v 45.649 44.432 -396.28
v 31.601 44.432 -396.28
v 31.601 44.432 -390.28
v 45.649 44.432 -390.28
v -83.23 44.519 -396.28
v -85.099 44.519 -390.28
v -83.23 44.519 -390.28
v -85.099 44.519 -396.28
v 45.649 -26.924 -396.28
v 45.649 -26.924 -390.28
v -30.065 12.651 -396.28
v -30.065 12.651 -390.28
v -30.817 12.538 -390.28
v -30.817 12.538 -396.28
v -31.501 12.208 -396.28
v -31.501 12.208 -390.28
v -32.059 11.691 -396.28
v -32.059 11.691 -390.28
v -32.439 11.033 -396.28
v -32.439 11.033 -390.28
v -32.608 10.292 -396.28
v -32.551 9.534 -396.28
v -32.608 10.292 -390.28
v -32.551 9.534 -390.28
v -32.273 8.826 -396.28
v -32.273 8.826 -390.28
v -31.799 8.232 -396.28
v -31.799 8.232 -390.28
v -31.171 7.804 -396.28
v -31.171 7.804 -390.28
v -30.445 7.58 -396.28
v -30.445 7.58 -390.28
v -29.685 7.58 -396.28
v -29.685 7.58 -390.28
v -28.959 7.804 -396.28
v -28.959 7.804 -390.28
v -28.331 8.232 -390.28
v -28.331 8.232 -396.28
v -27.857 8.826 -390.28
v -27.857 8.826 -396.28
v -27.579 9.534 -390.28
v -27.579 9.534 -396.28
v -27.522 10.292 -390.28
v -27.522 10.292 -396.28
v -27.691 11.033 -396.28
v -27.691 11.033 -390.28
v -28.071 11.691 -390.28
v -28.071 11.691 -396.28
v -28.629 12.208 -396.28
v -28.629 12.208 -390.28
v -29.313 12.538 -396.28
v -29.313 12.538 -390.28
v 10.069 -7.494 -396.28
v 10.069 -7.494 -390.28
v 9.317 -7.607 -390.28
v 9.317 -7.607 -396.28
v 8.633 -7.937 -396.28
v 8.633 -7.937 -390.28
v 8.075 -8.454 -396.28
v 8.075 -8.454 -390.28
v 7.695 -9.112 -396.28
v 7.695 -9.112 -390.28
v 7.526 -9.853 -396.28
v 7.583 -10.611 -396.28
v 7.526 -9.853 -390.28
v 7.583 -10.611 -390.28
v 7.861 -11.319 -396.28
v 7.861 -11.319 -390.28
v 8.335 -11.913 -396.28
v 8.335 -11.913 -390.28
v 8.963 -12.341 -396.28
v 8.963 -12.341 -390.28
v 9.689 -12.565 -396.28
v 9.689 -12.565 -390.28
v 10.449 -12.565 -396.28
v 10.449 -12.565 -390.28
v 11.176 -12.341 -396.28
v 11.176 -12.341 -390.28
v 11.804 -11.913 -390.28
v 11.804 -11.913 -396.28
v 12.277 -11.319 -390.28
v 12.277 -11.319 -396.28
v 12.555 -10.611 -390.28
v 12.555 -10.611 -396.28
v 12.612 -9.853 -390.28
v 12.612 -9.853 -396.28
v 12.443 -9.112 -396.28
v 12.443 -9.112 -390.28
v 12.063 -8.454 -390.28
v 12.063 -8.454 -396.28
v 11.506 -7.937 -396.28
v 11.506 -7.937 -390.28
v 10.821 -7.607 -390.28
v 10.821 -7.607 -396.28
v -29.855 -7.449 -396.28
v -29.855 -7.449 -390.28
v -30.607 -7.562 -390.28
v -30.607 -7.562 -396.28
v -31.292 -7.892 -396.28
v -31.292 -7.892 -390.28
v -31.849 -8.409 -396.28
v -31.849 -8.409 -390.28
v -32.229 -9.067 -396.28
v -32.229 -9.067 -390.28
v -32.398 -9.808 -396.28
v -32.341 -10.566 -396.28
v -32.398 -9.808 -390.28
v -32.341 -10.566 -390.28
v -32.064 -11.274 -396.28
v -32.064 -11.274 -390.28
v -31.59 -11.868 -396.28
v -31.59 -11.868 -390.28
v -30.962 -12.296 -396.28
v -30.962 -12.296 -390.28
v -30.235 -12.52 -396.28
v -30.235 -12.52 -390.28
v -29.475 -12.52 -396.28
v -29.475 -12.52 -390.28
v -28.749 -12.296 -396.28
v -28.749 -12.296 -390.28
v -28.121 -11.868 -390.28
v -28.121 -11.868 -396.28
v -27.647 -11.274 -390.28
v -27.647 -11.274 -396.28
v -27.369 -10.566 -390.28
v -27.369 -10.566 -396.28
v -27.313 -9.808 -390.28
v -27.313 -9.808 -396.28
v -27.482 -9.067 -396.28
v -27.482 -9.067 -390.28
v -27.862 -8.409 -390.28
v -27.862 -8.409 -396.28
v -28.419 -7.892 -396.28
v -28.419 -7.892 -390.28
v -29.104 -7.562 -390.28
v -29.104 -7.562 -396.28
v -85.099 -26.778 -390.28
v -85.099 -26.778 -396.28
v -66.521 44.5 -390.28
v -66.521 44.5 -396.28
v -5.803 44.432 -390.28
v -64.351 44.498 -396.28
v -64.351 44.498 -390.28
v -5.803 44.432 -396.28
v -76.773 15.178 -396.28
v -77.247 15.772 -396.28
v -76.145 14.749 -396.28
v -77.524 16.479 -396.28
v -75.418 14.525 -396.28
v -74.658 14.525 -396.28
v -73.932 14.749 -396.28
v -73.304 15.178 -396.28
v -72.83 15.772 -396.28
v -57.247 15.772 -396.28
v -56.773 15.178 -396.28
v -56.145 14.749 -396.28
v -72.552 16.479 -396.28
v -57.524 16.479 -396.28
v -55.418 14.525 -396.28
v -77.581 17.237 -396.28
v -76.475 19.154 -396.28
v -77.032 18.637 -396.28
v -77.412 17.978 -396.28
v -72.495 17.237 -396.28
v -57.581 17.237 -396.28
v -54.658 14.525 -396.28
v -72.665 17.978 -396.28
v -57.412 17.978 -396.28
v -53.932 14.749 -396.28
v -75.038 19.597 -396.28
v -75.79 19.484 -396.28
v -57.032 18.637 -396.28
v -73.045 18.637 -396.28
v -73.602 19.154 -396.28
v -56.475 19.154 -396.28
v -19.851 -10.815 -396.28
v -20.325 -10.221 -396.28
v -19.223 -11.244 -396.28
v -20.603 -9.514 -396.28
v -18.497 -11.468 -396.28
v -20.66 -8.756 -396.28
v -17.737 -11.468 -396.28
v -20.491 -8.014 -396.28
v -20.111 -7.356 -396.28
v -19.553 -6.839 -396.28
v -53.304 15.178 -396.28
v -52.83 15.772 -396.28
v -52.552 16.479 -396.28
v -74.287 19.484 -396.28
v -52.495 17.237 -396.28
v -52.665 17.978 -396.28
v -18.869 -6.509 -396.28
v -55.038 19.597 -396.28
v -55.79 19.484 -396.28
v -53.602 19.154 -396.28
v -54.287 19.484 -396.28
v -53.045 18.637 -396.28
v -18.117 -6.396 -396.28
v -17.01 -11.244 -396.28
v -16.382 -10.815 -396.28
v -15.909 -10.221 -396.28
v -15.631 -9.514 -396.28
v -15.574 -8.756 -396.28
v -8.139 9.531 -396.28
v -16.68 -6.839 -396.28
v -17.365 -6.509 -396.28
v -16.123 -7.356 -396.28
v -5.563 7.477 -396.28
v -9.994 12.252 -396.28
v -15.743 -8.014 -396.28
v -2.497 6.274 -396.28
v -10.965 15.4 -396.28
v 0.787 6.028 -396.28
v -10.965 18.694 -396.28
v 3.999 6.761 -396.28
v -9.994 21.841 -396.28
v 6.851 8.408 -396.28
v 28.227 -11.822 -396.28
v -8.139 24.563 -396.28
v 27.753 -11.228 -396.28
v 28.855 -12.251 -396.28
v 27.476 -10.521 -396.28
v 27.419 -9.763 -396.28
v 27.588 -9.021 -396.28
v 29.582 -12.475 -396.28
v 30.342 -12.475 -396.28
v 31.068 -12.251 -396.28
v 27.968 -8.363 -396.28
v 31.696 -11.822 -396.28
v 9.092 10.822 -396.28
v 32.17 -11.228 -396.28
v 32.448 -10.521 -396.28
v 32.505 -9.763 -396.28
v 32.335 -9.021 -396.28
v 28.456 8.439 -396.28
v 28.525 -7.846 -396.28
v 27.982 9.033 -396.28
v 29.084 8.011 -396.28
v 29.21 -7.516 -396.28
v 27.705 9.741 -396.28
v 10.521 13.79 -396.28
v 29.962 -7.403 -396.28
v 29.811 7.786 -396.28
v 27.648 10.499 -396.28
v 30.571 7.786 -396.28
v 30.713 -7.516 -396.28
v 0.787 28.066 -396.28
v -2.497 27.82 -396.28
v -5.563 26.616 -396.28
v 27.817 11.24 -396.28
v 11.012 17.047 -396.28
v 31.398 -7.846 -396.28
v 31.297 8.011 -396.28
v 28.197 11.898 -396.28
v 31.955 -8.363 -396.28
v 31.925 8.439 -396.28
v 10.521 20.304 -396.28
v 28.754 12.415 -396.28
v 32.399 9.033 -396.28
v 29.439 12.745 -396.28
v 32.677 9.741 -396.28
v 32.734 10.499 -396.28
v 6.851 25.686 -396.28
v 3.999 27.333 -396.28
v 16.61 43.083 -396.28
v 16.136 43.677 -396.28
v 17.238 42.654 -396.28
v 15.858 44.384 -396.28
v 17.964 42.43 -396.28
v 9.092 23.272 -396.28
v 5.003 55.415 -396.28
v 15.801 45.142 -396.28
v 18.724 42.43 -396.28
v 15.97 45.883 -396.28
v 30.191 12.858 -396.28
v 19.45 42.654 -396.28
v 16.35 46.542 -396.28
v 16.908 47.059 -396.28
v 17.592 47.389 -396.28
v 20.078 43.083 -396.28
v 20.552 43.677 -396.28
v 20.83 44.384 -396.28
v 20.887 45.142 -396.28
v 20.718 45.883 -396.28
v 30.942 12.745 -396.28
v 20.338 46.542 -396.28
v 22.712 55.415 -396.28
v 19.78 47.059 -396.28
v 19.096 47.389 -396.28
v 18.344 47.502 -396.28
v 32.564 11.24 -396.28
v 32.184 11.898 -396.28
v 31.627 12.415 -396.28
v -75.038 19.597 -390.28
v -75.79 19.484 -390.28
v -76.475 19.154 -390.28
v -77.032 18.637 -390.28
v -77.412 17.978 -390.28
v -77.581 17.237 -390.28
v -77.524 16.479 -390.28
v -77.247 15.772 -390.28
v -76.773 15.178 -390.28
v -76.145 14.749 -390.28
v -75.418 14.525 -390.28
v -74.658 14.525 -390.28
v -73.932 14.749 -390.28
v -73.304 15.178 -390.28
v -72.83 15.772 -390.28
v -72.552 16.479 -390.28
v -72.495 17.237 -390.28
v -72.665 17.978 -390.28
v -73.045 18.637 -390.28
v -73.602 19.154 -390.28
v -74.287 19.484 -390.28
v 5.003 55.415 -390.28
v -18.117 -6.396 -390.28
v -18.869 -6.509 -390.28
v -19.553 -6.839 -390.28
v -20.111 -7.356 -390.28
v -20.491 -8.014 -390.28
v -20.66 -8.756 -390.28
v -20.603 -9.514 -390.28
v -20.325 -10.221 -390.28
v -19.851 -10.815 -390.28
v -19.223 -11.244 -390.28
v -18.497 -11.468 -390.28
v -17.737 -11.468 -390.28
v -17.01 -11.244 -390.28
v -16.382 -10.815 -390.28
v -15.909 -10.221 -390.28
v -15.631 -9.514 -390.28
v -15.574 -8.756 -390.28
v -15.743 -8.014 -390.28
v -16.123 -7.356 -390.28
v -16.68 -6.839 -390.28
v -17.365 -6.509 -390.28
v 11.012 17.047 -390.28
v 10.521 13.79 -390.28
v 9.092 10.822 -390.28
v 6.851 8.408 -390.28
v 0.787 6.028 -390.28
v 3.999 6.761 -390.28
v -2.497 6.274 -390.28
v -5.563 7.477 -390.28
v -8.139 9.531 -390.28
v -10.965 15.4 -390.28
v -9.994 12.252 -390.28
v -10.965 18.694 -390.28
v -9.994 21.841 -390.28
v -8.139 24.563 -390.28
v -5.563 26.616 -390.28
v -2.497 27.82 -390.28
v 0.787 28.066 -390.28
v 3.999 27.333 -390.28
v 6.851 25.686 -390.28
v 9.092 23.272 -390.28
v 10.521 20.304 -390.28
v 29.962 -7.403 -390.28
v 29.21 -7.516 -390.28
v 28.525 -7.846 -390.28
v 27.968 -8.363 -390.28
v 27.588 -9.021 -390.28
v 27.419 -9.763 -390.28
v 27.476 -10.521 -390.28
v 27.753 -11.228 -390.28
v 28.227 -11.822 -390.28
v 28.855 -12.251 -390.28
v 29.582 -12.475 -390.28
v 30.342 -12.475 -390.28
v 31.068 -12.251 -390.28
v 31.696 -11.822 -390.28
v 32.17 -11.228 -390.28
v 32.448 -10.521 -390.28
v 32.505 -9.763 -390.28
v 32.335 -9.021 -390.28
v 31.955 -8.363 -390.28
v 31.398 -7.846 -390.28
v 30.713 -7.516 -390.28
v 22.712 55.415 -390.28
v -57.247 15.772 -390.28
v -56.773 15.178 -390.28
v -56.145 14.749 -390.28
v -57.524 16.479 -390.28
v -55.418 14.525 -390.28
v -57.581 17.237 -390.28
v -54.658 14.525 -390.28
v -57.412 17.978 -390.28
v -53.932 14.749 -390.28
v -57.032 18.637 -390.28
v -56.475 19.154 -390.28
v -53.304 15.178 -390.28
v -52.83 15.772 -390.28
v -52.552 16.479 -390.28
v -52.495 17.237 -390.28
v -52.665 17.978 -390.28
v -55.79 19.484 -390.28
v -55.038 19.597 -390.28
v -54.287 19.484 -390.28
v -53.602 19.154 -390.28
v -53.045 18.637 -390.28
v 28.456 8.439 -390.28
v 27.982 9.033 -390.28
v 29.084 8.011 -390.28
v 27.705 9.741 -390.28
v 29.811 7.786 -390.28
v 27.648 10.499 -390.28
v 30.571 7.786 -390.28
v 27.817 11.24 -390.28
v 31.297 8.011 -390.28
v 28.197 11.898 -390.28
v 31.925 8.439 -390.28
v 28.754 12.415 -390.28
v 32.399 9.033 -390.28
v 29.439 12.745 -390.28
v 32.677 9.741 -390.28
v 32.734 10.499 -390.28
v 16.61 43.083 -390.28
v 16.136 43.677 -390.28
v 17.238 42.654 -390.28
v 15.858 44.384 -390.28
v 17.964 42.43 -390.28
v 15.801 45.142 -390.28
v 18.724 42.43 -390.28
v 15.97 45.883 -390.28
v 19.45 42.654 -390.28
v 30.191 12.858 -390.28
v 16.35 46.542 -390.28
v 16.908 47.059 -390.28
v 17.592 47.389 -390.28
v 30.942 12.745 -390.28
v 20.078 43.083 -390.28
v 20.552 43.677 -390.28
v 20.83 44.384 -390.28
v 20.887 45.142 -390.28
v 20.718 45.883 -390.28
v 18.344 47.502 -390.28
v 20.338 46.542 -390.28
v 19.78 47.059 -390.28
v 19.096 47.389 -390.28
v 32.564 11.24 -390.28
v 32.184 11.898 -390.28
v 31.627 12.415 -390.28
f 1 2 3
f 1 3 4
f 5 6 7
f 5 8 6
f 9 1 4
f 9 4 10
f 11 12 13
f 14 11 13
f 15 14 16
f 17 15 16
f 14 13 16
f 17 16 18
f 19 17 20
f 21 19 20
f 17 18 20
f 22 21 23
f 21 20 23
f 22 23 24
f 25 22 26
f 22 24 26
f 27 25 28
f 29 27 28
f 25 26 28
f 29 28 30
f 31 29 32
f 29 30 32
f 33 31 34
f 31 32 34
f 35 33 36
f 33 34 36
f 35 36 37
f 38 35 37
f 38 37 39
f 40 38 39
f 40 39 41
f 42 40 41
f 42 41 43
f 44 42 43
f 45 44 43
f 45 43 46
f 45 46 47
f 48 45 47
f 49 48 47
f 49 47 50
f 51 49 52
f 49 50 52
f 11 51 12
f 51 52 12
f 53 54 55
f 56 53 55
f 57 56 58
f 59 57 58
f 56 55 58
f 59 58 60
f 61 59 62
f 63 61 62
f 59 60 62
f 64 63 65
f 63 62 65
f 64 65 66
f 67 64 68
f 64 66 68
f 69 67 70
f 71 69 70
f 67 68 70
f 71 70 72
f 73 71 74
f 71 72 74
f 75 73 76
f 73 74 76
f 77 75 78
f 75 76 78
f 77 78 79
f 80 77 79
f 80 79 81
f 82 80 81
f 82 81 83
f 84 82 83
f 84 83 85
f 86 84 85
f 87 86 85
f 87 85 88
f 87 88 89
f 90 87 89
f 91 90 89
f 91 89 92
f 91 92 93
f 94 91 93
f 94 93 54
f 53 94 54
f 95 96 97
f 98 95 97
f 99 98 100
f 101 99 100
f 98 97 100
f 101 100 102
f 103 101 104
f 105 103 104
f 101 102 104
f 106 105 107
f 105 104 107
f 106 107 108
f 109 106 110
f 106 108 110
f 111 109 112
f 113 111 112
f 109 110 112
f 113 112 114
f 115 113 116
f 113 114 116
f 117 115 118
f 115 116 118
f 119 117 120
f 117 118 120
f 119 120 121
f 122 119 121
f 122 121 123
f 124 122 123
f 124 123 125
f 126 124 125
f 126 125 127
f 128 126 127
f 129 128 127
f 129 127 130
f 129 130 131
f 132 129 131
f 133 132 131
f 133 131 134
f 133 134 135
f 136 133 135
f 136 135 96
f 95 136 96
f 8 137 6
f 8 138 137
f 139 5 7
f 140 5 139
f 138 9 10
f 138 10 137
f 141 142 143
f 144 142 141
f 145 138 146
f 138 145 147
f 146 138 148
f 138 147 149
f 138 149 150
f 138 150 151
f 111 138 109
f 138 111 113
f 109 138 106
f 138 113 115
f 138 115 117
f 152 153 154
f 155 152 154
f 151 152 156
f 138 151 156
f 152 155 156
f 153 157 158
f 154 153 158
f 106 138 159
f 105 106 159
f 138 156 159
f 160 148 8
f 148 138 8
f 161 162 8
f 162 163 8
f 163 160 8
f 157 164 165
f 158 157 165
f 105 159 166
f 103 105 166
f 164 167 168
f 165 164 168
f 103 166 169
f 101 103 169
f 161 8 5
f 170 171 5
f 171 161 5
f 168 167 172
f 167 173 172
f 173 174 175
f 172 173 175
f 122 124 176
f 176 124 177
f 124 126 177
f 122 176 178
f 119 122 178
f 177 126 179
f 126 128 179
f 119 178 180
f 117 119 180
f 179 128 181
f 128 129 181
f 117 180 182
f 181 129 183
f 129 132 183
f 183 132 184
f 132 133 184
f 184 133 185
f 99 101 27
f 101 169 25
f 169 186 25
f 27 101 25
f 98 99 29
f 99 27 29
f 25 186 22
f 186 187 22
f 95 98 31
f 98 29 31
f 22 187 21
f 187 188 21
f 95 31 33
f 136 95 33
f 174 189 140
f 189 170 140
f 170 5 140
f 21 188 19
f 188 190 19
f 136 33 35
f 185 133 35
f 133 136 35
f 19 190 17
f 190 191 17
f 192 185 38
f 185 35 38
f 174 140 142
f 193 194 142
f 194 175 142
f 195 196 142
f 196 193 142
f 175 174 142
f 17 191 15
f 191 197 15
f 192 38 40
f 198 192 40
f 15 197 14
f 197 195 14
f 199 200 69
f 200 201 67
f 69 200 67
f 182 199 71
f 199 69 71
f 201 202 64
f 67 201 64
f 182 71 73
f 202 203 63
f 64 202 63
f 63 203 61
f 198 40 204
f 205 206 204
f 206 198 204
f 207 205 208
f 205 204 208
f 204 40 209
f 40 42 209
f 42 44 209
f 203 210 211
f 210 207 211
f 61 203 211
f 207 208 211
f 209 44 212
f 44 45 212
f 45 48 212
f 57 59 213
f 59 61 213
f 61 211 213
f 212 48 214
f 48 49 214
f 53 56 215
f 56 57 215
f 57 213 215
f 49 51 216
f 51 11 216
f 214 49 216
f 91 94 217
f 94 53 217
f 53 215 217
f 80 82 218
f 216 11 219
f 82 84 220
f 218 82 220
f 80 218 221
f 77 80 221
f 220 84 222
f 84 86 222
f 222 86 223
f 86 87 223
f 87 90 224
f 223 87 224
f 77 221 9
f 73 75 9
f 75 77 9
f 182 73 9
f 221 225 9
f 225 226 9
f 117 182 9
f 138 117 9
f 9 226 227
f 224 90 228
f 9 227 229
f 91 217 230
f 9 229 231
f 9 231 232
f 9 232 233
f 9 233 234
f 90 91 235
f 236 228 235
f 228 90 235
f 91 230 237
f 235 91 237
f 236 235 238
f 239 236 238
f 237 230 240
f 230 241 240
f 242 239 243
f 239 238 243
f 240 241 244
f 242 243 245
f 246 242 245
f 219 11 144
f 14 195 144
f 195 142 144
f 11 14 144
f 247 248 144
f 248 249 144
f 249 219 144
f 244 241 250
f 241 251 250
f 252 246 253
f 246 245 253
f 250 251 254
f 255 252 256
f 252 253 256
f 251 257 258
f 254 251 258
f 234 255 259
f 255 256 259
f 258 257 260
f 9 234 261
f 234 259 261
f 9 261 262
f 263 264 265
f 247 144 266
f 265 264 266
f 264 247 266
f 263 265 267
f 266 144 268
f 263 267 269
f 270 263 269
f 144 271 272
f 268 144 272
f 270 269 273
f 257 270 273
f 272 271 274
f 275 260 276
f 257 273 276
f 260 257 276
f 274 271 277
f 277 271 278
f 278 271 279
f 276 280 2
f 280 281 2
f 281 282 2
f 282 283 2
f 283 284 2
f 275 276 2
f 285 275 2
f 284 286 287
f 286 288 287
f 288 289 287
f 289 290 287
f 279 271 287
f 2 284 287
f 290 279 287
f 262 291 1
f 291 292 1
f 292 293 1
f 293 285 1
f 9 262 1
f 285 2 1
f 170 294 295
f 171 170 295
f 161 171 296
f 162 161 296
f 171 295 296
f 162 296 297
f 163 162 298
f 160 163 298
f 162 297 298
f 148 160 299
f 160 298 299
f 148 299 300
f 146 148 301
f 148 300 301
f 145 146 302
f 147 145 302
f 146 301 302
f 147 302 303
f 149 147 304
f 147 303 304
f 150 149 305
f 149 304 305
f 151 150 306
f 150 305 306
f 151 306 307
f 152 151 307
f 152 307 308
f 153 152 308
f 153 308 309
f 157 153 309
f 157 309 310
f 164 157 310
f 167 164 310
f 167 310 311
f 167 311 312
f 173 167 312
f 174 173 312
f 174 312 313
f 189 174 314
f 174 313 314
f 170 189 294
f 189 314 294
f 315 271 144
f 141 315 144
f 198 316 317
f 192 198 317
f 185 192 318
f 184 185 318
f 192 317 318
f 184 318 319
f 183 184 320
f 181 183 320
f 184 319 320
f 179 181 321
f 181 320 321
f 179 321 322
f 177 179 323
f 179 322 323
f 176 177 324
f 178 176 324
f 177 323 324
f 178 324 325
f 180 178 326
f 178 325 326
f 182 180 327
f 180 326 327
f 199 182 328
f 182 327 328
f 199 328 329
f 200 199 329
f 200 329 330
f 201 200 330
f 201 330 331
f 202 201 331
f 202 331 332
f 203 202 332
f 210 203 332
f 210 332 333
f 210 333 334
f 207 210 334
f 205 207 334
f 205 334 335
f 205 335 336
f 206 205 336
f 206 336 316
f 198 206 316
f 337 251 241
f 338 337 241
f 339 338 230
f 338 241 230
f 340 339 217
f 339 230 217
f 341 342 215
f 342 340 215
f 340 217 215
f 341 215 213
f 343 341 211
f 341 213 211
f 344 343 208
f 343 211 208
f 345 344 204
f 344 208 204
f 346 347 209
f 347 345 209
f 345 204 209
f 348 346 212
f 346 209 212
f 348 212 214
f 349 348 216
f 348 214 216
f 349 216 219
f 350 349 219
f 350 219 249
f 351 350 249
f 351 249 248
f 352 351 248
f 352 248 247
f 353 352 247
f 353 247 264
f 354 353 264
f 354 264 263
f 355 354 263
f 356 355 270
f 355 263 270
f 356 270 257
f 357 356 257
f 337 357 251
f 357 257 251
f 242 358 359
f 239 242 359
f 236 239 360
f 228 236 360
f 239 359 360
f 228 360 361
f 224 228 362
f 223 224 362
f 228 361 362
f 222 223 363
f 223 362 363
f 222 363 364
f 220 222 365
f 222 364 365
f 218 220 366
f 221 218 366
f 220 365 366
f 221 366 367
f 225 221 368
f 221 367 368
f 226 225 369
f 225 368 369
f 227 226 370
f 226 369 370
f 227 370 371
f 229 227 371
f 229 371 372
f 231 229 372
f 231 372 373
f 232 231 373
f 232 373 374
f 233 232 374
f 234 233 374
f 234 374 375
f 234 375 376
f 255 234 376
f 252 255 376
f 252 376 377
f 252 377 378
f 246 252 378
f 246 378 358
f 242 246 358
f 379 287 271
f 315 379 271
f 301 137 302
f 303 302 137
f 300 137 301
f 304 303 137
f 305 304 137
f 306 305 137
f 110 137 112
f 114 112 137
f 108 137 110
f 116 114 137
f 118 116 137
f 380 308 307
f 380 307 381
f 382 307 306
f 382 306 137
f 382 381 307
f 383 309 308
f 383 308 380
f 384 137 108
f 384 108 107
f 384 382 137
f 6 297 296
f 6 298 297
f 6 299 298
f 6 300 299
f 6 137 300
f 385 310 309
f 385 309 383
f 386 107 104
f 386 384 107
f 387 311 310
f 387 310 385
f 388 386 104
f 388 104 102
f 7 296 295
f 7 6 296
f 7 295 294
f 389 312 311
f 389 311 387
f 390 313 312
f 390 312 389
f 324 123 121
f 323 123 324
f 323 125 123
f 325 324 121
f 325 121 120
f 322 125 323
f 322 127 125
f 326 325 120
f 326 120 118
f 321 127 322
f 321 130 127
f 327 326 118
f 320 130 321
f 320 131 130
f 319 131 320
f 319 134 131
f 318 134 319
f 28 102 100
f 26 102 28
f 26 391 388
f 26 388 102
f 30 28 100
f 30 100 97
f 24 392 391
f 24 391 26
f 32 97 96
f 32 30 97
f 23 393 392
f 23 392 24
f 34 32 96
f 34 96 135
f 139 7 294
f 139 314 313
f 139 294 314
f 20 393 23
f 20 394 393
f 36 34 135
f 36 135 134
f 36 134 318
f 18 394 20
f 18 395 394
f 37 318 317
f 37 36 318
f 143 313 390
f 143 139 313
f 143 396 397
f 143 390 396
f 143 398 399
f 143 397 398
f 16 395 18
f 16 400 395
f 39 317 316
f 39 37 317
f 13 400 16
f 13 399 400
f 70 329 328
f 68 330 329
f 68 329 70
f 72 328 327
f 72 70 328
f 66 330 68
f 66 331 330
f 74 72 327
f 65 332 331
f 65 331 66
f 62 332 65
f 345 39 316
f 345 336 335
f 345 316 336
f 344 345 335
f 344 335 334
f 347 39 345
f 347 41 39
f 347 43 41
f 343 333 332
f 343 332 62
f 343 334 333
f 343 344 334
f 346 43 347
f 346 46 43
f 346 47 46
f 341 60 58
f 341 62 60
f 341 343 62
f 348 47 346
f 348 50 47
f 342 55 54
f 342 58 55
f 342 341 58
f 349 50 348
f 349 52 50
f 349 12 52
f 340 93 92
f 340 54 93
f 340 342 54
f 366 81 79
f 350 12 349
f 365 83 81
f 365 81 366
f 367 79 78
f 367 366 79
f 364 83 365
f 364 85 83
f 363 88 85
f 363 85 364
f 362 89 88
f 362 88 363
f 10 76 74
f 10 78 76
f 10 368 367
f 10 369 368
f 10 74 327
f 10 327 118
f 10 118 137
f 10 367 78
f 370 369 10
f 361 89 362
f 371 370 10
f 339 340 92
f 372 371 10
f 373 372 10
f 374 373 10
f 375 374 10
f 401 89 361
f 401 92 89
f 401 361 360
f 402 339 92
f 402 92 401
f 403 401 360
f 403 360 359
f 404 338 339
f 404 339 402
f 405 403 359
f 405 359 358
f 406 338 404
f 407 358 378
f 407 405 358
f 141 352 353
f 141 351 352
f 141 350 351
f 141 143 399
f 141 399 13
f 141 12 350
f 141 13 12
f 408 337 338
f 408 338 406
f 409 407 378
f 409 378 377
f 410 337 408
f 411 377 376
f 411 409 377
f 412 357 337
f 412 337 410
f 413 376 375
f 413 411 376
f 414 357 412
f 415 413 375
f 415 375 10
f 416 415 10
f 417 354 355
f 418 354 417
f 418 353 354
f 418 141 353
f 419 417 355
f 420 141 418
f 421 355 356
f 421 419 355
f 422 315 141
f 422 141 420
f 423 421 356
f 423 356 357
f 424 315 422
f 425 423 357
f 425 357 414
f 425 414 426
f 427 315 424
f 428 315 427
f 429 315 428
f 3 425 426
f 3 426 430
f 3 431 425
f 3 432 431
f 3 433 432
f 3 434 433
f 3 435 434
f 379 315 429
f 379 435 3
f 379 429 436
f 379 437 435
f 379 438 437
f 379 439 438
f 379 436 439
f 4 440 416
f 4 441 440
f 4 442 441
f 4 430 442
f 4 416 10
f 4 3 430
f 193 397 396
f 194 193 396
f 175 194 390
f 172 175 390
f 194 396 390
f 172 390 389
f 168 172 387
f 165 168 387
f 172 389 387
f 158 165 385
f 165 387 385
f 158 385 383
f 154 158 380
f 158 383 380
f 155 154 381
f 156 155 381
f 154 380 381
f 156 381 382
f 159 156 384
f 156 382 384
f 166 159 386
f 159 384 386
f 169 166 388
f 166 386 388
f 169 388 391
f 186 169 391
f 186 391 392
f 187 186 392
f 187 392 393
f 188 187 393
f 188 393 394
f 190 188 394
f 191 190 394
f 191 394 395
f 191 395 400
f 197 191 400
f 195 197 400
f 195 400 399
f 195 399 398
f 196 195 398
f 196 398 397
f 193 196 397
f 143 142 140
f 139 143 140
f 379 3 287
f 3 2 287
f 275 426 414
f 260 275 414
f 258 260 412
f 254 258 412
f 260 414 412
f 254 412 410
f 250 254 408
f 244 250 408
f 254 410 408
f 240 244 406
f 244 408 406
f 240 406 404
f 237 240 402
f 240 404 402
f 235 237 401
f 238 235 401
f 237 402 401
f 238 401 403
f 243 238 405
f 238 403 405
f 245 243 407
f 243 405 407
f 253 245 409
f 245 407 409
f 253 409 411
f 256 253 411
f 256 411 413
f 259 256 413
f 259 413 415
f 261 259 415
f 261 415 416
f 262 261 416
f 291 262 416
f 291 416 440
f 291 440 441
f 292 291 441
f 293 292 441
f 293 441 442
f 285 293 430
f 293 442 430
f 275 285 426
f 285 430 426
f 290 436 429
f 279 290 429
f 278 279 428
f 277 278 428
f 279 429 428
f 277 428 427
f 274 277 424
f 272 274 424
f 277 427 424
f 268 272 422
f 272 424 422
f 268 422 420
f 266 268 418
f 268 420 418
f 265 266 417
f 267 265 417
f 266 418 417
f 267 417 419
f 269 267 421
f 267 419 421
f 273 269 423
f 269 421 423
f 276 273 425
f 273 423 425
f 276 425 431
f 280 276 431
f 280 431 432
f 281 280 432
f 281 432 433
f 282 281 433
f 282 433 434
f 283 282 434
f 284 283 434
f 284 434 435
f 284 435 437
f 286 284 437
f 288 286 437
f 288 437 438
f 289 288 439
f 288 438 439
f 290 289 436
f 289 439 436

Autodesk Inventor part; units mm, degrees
ref_plane "YZ Plane" through (0, 0, 0) normal (1, 0, 0) x (0, 1, 0)
ref_plane "XZ Plane" through (0, 0, 0) normal (0, 1, 0) x (-1, 0, 0)
ref_plane "XY Plane" through (0, 0, 0) normal (0, 0, 1) x (1, 0, 0)
ref_plane "Work Plane1" through (-0.0001, 0, -396.2798) normal (0, 0, 1) x (1, 0, 0)
sketch "Sketch1" plane through (-0.0001, 0, -396.2798) normal (0, 0, 1) x (1, 0, 0)
  circle A0 centre (29.9617, 10.0469) radius 2.1 projected
  circle A1 centre (29.9617, -9.9531) radius 2.1 projected
  circle A2 centre (-30.0383, -9.9531) radius 2.1 projected
  circle A3 centre (-30.0383, 10.0469) radius 2.1 projected
  circle A4 centre (-10.0383, -9.9531) radius 2.1 projected
  circle A5 centre (9.9617, -9.9531) radius 2.1 projected
  line L0 (39.9617, 19.5469) -> (39.9617, 14.8783) projected
  line L1 (39.9617, -14.7846) -> (39.9617, -19.4531) projected
  line L2 (39.4617, -19.9531) -> (34.7932, -19.9531) projected
  line L3 (20.4617, 20.0469) -> (25.0617, 20.0469) projected
  line L4 (-34.8697, -19.9531) -> (-39.5383, -19.9531) projected
  line L5 (-40.0383, 14.8783) -> (-40.0383, 19.5469) projected
  line L6 (-39.5383, 20.0469) -> (-34.9383, 20.0469) projected
  line L7 (-40.0383, -19.4531) -> (-40.0383, -14.7846) projected
  line L8 (39.9617, 20.0469) -> (39.9617, -19.9532) construction
  line L9 (39.9617, -19.9532) -> (-40.0383, -19.9531) construction
  line L10 (-40.0383, -19.9531) -> (-40.0383, 20.0469) construction
  line L11 (-20.0383, 19.5469) -> (-20.0383, 14.8783) projected
  line L12 (19.9617, 0.0469) -> (19.9617, 5.2154) projected
  line L13 (-20.0383, 0.0469) -> (-14.9383, 0.0469) projected
  line L14 (39.9617, 20.0469) -> (19.9617, 20.0469) construction
  line L15 (19.9617, 20.0469) -> (19.9617, 0.0469) construction
  line L16 (-20.0383, 0.0469) -> (19.9617, 0.0469) construction
  line L17 (-40.0383, 20.0469) -> (-20.0383, 20.0469) construction
  line L18 (-20.0383, 20.0469) -> (-20.0383, 0.0469) construction
  line L19 (45.6493, 27.0762) -> (45.6493, -26.9238)
  line L20 (-64.252, 0) -> (79.446, 0) construction
  line L21 (18.0586, 45.1257) -> (28.1307, -1.0304) construction
  line L22 (28.1307, -1.0304) -> (-18.0254, -11.1025) construction
  circle A6 centre (28.1307, -1.0304) radius 2.55
  circle A7 centre (-18.0452, -9.0596) radius 2.55
  circle A8 centre (18.0586, 45.1257) radius 2.55
  circle A9 centre (-18.0452, -9.0596) radius 3.5 construction
  circle A10 centre (18.0586, 45.1257) radius 3.5 construction
  circle A11 centre (28.1307, -1.0304) radius 3.5 construction
  line L23 (48.593, 17.0469) -> (-85.0986, 17.0469) construction
  line L24 (-0.0383, 40.3857) -> (-0.0383, -33.3677) construction
  circle A12 centre (-0.0383, 17.0469) radius 11.05
  line L25 (31.6013, 44.4325) -> (22.7125, 55.4148)
  line L26 (22.7125, 55.4148) -> (5.0035, 55.4148)
  line L27 (5.0035, 55.4148) -> (-5.8027, 44.4325)
  line L28 (-64.3507, 44.498) -> (-5.8027, 44.4325)
  line L29 (-64.3507, 44.498) -> (-66.5209, 44.5005)
  line L30 (-55.0383, 44.4876) -> (-55.0383, -55.6033) construction
  line L31 (45.6493, -26.9238) -> (-85.0986, -26.7776)
  line L32 (45.6493, -26.9238) -> (185.0342, -26.9238) construction
  line L33 (40.0498, -55.6502) -> (39.9617, -55.6502)
  line L34 (-83.2302, 44.5192) -> (-66.5209, 44.5005)
  line L35 (-85.0986, -26.7776) -> (-85.0986, 44.5192)
  line L36 (-85.0986, 44.5192) -> (-83.2302, 44.5192)
  line L37 (-5.8027, 44.4325) -> (31.6013, 44.4325) construction
  line L38 (31.6013, 44.4325) -> (45.6493, 44.4325)
  line L39 (45.6493, 44.4325) -> (45.6493, 27.0762)
  point P0 (0, 0)
  point P1 (0, 17)
  point P2 (22.7617, 20.0469)
  point P3 (19.9617, 2.6311)
  point P4 (-40.0383, -17.1189)
  point P5 (-55.0383, -5.5579)
  point P6 (-75.0383, 17.0469)
  point P7 (-55.0383, 17.0469)
  dimension "d2" = 110
  dimension "d3" = 5.1
  dimension "d4" = 5.1
  dimension "d5" = 5.1
  dimension "d7" = 7
  dimension "d8" = 7
  dimension "d9" = 7
  dimension "d10" = 3
  dimension "d11" = 20
  dimension "d12" = 22.1
  dimension "d30" = 15
  dimension "d33" = 54
  dimension "d36" = 20
  dimension "d37" = 15
extrude "Extrusion1" add sketch "Sketch1" along normal blind 6 contours A0 | A1 | A2 | A3 | A4 | A5 | L19 L31 L35 L36 L34 L29 L28 L27 L26 L25 L38 L39 | A6 | A7 | A8
sketch "Sketch2" plane through (-0.0001, 0, -396.2798) normal (0, 0, -1) x (-1, 0, 0)
  point P0 (0, 0)
  point P1 (-29.9617, -9.9531)
  point P2 (-10.0691, -10.0439)
  point P3 (9.9252, -10.1028)
  point P4 (18.1169, -8.9461)
  point P5 (29.8554, -9.9987)
  point P6 (30.0649, 10.1011)
  point P7 (-30.1907, 10.308)
  point P8 (-18.3441, 44.9518)
  point P9 (55.0383, 17.0469)
  point P10 (75.0383, 17.0469)
hole "Hole1" at (29.9617, -9.9531, -396.2798) at (10.0691, -10.0439, -396.2798) at (-18.1169, -8.9461, -396.2798) at (-29.8554, -9.9987, -396.2798) at (-30.065, 10.1011, -396.2798) at (30.1907, 10.308, -396.2798) at (18.344, 44.9518, -396.2798) at (-75.0383, 17.0468, -396.2798) at (-55.0383, 17.0468, -396.2798) direction (0, 0, 1) diameter 5.1 end through all
properties part number "X axis motor mount_3DPrint"
